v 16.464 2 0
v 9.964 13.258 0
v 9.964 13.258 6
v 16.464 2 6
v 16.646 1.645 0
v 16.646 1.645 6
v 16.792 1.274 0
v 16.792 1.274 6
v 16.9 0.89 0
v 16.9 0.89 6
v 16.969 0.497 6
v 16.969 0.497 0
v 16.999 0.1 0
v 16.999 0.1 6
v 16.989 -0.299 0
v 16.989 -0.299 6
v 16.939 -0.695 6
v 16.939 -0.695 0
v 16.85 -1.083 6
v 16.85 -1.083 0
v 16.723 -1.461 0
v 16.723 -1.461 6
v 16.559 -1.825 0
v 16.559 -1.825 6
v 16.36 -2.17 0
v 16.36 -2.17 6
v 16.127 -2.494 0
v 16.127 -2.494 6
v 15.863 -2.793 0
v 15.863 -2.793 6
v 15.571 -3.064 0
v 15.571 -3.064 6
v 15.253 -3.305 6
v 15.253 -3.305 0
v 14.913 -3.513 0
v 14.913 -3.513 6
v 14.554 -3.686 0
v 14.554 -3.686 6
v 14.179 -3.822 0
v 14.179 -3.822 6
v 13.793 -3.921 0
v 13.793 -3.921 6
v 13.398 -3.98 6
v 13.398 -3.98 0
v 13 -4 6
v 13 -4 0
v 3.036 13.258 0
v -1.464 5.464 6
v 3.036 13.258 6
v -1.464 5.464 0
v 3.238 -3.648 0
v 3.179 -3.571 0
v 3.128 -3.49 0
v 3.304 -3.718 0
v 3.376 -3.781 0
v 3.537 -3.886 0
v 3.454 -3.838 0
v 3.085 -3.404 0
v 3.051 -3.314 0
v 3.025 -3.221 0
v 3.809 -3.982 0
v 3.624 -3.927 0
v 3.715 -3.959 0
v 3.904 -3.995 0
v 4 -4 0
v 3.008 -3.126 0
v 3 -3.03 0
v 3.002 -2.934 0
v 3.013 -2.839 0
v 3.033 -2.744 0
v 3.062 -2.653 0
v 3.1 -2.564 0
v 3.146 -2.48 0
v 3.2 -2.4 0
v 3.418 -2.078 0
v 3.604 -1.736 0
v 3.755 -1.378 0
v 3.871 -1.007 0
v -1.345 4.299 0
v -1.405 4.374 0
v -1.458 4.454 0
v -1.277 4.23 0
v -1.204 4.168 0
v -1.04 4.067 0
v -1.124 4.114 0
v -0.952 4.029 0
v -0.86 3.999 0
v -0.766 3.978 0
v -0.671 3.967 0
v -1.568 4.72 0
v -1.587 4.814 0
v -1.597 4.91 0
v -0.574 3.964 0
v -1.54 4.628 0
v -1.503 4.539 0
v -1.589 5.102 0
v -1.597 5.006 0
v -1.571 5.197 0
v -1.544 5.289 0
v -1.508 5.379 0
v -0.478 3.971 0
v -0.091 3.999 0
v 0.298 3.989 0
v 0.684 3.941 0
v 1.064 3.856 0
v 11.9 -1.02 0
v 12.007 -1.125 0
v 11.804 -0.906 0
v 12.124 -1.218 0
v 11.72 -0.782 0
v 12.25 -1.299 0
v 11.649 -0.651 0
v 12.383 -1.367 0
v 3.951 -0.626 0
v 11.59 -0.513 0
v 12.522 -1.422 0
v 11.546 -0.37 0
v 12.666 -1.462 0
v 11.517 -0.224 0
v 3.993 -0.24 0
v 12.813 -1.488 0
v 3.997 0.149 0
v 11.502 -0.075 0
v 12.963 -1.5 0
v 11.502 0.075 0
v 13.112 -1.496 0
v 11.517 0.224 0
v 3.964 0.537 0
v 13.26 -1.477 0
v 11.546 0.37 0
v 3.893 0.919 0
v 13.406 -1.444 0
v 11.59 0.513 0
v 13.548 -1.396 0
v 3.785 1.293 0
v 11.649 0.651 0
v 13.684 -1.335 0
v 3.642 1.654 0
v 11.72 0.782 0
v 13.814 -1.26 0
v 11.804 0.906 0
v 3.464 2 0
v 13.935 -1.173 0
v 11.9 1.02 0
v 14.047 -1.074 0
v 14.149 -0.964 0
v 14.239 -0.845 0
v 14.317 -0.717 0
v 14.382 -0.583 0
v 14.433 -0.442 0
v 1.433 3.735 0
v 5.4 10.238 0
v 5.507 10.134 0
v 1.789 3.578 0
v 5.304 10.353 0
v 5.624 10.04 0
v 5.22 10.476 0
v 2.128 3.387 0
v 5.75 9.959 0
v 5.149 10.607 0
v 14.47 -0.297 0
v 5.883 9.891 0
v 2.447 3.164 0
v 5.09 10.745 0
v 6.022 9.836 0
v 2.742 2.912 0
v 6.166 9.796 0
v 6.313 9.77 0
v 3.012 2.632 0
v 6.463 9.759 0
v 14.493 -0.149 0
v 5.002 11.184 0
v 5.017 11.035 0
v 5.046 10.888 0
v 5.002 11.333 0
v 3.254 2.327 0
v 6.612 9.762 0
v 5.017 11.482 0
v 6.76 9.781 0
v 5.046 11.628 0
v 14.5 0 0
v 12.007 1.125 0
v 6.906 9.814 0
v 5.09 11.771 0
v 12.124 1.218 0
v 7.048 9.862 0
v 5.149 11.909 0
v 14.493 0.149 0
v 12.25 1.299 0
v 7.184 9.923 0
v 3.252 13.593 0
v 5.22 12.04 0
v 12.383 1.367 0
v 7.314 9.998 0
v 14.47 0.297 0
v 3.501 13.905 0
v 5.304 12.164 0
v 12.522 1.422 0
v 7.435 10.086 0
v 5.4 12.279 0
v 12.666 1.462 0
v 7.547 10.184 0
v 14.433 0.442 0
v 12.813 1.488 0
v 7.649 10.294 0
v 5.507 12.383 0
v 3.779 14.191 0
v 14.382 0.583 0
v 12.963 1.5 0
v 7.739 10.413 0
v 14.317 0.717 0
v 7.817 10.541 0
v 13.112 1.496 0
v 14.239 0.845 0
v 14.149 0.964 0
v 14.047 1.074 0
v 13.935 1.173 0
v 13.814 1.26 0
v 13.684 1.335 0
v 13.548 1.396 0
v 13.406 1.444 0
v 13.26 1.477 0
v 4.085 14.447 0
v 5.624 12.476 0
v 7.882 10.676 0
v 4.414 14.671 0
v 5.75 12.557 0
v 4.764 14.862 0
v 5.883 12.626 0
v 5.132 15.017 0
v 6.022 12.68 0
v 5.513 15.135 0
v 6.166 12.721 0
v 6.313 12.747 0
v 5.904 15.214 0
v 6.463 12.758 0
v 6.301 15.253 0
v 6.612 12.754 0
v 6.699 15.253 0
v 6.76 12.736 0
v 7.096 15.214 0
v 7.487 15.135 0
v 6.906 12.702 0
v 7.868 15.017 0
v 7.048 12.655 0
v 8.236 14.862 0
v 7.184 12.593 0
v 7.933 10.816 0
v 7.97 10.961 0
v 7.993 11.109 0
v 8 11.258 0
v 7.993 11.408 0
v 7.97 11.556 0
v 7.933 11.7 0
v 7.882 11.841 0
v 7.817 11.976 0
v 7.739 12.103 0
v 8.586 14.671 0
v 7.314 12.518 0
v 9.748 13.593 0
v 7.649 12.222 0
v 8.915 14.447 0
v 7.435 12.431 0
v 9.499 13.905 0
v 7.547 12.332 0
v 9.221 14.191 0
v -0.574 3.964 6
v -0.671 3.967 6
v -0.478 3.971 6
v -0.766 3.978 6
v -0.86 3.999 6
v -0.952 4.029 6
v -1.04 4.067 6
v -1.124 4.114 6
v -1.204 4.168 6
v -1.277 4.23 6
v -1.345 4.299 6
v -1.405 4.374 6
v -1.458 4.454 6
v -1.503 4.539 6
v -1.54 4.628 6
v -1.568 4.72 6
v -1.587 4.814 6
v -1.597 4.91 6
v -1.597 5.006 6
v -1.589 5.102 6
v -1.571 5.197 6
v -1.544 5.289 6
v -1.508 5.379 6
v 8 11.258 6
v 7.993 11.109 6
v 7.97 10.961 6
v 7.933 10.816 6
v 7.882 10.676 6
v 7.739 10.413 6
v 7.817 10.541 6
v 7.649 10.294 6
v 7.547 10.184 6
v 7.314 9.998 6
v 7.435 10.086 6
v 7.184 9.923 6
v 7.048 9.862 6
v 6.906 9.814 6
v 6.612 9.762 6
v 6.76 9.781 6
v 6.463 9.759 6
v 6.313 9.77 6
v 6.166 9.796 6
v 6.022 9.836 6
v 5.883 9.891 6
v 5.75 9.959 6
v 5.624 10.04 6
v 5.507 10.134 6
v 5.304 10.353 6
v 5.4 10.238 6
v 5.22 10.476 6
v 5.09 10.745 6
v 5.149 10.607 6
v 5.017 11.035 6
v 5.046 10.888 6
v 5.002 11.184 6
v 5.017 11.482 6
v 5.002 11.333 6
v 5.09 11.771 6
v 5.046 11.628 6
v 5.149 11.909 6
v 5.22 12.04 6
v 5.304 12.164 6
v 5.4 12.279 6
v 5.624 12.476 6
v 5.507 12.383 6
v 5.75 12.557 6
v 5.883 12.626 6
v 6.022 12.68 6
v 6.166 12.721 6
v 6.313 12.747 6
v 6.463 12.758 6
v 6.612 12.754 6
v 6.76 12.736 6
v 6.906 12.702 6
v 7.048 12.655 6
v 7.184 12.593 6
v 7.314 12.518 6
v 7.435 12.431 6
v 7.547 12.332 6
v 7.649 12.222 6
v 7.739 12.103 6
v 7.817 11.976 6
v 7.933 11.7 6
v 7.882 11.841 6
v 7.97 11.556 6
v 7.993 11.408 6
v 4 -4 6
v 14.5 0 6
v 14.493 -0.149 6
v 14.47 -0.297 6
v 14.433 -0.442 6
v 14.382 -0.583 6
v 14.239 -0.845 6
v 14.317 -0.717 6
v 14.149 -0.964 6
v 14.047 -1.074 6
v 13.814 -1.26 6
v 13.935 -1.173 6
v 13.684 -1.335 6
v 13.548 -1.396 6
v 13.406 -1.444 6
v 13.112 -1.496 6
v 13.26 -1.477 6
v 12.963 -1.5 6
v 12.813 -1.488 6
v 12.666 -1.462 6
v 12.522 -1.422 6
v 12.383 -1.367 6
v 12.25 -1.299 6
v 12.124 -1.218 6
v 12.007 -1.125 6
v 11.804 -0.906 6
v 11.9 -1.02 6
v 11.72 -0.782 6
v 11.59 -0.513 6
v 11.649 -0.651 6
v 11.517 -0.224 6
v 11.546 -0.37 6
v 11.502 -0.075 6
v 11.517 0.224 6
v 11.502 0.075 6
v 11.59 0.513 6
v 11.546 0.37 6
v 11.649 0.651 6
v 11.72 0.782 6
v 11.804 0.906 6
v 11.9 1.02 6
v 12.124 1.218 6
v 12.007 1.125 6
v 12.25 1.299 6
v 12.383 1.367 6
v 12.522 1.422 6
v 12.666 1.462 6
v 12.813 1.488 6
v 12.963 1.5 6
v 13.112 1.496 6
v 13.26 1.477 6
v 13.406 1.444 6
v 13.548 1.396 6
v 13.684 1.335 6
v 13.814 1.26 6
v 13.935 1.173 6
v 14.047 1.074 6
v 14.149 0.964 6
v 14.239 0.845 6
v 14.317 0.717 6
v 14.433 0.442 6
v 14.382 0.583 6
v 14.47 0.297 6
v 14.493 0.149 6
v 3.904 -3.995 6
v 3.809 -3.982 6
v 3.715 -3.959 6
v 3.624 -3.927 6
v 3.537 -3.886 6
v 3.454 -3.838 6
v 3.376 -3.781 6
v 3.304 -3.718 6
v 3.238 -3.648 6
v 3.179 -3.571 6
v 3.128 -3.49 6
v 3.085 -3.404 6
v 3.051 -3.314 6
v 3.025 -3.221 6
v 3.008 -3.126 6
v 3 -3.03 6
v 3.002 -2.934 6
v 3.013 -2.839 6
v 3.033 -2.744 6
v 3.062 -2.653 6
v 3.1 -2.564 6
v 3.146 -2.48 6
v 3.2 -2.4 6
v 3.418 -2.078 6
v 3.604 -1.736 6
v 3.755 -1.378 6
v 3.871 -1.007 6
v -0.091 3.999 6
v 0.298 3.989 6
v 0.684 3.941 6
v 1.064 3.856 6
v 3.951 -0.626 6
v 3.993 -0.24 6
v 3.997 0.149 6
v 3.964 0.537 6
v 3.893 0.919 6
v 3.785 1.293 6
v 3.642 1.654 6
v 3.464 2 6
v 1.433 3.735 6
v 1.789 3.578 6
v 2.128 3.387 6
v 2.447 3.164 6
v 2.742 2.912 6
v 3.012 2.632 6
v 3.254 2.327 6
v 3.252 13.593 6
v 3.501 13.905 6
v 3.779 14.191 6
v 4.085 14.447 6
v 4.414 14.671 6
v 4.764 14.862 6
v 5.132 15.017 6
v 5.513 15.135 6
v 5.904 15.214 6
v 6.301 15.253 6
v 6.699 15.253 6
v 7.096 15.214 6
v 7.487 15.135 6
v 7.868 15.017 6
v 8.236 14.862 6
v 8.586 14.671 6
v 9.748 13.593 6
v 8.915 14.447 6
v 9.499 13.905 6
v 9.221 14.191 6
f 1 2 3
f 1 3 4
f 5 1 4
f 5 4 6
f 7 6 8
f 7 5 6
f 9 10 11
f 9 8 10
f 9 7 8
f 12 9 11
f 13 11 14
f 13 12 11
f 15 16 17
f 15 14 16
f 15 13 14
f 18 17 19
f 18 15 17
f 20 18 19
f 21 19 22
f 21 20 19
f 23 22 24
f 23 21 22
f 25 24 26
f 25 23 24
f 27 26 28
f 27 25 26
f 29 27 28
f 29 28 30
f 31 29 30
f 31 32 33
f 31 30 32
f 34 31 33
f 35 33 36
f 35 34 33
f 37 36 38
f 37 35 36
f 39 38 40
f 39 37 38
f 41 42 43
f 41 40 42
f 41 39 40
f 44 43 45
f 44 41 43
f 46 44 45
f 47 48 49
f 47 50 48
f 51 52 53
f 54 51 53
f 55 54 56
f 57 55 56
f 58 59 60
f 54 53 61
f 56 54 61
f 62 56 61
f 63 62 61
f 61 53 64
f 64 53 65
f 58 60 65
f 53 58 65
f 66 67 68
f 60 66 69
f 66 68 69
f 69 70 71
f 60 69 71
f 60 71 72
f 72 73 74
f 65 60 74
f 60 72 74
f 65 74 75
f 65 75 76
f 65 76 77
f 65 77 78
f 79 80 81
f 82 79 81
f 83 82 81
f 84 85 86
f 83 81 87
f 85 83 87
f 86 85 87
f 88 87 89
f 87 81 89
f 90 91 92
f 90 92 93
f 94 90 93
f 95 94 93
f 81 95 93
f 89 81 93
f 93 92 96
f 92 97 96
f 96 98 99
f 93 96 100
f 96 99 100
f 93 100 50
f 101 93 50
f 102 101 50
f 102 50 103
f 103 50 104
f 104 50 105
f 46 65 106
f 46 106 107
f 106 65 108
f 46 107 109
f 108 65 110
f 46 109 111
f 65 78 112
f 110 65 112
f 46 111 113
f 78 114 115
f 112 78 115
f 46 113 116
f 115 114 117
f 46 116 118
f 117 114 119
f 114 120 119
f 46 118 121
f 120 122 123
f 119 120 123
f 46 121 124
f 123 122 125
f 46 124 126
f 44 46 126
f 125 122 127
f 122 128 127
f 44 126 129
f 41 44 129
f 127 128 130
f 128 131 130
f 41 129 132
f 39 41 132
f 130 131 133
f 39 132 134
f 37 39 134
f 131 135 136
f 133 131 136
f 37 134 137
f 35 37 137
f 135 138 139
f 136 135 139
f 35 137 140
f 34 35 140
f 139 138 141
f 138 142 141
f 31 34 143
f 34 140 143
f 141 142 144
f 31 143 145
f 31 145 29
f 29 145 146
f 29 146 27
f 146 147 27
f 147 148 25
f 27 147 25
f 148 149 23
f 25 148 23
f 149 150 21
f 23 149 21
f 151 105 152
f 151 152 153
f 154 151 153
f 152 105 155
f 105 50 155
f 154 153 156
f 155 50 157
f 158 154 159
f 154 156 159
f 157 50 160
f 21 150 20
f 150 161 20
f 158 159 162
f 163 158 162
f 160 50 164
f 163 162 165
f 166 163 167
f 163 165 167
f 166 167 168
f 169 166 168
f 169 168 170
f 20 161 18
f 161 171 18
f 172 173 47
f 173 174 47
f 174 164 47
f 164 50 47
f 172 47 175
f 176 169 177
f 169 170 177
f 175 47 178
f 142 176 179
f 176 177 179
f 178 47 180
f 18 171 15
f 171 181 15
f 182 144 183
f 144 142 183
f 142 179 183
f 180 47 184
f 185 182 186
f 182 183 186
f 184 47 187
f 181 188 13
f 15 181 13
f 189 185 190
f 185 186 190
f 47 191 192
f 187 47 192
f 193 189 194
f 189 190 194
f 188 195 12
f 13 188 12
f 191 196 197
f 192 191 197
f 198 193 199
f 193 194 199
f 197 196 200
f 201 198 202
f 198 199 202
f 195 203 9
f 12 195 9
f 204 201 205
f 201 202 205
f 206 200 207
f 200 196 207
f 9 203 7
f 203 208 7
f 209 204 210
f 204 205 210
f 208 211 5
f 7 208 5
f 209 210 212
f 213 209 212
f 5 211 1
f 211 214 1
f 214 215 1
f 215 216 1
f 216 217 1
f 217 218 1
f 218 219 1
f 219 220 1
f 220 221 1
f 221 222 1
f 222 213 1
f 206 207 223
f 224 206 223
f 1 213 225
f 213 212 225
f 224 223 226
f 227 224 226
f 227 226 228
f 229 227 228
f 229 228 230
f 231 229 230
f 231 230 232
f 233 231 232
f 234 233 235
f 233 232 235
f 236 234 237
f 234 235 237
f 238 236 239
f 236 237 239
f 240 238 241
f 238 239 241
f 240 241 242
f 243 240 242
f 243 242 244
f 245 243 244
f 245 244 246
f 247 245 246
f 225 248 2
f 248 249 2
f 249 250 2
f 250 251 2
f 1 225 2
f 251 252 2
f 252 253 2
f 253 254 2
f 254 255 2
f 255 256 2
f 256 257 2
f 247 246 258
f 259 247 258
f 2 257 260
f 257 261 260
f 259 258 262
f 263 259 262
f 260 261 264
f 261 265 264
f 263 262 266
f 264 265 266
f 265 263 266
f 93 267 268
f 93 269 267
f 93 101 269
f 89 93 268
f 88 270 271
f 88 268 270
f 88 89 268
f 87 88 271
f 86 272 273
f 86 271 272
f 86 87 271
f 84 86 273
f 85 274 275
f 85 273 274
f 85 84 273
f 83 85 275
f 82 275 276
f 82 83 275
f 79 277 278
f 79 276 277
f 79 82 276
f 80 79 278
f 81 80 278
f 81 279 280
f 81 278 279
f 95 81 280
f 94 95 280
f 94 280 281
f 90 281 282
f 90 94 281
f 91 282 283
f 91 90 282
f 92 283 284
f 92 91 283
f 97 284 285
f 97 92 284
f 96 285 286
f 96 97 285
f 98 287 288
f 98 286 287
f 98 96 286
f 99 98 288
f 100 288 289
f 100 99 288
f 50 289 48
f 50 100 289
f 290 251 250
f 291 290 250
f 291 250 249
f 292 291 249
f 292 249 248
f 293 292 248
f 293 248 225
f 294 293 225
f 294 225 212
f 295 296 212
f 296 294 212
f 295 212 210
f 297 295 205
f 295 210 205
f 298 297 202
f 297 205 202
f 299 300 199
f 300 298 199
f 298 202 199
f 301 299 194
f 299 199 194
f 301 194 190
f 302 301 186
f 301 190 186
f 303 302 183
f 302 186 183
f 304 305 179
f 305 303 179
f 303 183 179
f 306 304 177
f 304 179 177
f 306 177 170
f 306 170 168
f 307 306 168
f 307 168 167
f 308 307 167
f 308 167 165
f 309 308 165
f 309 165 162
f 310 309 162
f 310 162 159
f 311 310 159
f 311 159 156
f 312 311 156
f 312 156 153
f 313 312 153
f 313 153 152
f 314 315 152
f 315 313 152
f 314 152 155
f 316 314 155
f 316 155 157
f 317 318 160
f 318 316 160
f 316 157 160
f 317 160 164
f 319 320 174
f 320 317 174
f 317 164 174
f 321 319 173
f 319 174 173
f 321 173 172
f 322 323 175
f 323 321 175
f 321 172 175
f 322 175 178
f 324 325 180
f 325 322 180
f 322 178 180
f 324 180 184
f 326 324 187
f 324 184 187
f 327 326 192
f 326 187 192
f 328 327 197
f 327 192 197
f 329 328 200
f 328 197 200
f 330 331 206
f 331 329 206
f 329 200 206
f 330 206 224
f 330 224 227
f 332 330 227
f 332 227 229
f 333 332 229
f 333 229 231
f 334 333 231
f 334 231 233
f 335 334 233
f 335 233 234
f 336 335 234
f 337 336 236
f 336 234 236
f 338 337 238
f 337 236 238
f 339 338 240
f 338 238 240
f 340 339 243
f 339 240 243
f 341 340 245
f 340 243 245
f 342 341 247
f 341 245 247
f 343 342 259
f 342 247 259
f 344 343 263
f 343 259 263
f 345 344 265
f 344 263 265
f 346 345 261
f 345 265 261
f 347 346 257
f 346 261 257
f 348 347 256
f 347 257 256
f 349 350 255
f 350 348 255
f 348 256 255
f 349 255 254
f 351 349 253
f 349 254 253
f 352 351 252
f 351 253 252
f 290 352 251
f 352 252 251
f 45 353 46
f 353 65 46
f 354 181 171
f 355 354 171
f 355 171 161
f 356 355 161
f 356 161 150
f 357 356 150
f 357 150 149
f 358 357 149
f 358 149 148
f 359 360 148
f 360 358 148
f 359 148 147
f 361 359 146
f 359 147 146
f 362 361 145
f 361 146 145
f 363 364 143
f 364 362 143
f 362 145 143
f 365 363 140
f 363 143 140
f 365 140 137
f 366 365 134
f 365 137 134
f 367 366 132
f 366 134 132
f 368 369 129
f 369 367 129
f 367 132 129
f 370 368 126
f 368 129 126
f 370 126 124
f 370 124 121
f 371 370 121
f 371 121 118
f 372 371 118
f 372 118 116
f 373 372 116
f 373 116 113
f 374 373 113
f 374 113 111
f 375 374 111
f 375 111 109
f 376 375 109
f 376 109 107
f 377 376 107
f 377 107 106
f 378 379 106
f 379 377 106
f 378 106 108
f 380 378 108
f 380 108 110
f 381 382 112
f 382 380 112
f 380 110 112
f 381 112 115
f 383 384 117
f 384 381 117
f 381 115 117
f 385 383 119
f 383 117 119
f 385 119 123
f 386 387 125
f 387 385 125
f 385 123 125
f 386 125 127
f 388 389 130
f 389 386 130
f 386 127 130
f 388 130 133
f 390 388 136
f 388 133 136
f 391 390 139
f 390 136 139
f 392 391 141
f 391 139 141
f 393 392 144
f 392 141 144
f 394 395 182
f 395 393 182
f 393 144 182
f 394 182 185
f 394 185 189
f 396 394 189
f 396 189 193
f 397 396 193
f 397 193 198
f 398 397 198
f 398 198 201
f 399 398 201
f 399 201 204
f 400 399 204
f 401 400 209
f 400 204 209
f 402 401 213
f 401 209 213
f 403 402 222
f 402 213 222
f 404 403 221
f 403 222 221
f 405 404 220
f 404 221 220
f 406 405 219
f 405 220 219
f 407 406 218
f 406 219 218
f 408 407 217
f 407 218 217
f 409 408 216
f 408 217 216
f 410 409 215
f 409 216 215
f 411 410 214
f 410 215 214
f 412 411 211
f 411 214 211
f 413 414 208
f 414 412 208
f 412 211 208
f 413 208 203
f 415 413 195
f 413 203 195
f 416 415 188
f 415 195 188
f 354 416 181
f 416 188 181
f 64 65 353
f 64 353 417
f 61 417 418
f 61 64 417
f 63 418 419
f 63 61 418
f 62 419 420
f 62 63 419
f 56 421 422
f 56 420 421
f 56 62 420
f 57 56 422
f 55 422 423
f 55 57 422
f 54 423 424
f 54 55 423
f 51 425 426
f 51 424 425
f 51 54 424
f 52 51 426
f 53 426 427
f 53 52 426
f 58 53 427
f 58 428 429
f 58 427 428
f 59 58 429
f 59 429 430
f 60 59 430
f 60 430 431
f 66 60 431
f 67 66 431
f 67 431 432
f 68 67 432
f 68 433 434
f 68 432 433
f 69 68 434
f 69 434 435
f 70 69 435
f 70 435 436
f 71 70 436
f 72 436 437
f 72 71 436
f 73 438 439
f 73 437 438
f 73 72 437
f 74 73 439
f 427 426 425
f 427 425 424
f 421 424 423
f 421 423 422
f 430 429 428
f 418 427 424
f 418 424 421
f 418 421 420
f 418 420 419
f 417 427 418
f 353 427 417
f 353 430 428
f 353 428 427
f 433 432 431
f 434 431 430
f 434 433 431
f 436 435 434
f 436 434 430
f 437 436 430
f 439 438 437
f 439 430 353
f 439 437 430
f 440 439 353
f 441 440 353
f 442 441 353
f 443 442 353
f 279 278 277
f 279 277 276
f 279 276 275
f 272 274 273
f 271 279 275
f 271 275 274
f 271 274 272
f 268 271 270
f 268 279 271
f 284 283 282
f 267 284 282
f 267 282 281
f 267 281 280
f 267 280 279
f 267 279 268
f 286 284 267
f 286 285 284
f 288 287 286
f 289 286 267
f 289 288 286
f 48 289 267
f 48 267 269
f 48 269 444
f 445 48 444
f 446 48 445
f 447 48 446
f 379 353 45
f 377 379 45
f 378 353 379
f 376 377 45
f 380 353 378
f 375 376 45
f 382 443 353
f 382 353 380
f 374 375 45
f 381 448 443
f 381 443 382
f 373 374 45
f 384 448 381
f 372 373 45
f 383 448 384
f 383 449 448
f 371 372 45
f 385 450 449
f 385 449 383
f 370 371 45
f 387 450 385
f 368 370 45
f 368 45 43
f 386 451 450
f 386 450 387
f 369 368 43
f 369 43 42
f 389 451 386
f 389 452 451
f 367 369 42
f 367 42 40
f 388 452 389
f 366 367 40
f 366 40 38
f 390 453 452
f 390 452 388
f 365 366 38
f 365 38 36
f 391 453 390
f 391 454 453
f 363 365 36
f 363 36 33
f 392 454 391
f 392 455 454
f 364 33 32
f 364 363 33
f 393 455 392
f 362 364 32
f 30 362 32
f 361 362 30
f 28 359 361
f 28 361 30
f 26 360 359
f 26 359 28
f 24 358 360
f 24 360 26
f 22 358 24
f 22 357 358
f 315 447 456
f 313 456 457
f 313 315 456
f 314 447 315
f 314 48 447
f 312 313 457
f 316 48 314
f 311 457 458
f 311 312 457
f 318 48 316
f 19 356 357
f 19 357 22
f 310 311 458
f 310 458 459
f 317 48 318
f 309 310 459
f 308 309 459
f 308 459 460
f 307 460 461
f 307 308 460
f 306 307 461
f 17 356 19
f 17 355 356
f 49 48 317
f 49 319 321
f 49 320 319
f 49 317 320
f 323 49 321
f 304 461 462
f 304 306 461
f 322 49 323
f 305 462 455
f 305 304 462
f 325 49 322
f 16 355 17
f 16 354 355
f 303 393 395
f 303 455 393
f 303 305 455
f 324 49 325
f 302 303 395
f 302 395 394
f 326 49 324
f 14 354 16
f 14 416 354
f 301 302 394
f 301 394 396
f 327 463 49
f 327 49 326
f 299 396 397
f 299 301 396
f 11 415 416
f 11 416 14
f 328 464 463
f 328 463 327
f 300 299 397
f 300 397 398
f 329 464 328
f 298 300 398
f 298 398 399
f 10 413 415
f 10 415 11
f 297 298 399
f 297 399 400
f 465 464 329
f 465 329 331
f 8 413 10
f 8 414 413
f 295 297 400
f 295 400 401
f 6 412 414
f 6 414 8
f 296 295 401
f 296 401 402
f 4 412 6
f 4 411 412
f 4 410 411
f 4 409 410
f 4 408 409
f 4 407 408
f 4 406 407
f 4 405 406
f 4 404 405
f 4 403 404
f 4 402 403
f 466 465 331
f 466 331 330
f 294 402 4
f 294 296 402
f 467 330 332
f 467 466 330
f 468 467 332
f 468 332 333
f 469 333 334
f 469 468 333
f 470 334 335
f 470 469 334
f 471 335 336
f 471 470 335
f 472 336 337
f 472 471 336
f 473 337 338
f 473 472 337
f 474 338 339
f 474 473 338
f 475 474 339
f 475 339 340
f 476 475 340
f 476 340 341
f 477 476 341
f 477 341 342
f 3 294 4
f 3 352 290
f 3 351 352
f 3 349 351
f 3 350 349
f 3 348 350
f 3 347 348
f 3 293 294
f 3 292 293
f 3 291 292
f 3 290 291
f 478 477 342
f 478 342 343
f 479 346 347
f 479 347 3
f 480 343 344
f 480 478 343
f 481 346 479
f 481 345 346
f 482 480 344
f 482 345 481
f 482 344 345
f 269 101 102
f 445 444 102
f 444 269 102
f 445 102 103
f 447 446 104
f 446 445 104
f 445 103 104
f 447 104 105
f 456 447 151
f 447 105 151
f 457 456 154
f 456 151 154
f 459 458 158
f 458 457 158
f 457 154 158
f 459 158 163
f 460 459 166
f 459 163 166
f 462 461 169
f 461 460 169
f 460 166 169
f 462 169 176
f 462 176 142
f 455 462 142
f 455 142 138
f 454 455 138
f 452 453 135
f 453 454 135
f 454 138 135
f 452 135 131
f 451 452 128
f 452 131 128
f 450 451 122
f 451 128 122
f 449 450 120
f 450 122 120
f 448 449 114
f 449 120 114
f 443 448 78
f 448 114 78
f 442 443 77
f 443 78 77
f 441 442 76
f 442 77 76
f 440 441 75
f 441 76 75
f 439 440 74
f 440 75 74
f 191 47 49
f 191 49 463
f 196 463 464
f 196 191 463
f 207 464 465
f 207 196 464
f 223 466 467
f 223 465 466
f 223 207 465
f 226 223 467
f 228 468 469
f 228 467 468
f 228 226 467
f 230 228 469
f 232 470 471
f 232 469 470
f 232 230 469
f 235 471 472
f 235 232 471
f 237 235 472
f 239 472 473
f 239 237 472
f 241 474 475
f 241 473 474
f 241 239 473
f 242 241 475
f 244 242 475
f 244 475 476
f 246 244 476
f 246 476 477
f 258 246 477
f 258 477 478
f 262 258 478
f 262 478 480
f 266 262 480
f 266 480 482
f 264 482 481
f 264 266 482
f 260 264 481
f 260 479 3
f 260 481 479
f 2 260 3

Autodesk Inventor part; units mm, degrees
ref_plane "YZ Plane" through (0, 0, 0) normal (1, 0, 0) x (0, 1, 0)
ref_plane "XZ Plane" through (0, 0, 0) normal (0, 1, 0) x (-1, 0, 0)
ref_plane "XY Plane" through (0, 0, 0) normal (0, 0, 1) x (1, 0, 0)
sketch "Sketch1" plane through (0, 0, 0) normal (0, 0, 1) x (1, 0, 0)
  circle A0 centre (13, 0) radius 1.5
  circle A1 centre (6.5, 11.2583) radius 1.5
  arc A2 (9.9641, 13.2583) -> (3.0359, 13.2583) centre (6.5, 11.2583) ccw
  arc A3 (13, -4) -> (16.4641, 2) centre (13, 0) ccw
  line L0 (9.9641, 13.2583) -> (16.4641, 2)
  arc A4 (3.2, -2.4) -> (-0.4785, 3.9713) centre (0, 0) ccw
  line L1 (4, -4) -> (13, -4)
  line L2 (-1.4641, 5.4641) -> (3.0359, 13.2583)
  arc A5 (-1.4641, 5.4641) -> (-0.4785, 3.9713) centre (-0.5981, 4.9641) ccw
  arc A6 (3.2, -2.4) -> (4, -4) centre (4, -3) ccw
  point P0 (0, -4)
  point P1 (-3.4641, 2)
  dimension "d0" = 3
  dimension "d1" = 3
  dimension "d3" = 13
  dimension "d4" = 13
  dimension "d24" = 60
  dimension "d25" = 8
  dimension "d26" = 8
  dimension "d27" = 8
  dimension "d30" = 1
extrude "Extrusion1" add sketch "Sketch1" along normal blind 6
properties part number "X_zaslepka"
